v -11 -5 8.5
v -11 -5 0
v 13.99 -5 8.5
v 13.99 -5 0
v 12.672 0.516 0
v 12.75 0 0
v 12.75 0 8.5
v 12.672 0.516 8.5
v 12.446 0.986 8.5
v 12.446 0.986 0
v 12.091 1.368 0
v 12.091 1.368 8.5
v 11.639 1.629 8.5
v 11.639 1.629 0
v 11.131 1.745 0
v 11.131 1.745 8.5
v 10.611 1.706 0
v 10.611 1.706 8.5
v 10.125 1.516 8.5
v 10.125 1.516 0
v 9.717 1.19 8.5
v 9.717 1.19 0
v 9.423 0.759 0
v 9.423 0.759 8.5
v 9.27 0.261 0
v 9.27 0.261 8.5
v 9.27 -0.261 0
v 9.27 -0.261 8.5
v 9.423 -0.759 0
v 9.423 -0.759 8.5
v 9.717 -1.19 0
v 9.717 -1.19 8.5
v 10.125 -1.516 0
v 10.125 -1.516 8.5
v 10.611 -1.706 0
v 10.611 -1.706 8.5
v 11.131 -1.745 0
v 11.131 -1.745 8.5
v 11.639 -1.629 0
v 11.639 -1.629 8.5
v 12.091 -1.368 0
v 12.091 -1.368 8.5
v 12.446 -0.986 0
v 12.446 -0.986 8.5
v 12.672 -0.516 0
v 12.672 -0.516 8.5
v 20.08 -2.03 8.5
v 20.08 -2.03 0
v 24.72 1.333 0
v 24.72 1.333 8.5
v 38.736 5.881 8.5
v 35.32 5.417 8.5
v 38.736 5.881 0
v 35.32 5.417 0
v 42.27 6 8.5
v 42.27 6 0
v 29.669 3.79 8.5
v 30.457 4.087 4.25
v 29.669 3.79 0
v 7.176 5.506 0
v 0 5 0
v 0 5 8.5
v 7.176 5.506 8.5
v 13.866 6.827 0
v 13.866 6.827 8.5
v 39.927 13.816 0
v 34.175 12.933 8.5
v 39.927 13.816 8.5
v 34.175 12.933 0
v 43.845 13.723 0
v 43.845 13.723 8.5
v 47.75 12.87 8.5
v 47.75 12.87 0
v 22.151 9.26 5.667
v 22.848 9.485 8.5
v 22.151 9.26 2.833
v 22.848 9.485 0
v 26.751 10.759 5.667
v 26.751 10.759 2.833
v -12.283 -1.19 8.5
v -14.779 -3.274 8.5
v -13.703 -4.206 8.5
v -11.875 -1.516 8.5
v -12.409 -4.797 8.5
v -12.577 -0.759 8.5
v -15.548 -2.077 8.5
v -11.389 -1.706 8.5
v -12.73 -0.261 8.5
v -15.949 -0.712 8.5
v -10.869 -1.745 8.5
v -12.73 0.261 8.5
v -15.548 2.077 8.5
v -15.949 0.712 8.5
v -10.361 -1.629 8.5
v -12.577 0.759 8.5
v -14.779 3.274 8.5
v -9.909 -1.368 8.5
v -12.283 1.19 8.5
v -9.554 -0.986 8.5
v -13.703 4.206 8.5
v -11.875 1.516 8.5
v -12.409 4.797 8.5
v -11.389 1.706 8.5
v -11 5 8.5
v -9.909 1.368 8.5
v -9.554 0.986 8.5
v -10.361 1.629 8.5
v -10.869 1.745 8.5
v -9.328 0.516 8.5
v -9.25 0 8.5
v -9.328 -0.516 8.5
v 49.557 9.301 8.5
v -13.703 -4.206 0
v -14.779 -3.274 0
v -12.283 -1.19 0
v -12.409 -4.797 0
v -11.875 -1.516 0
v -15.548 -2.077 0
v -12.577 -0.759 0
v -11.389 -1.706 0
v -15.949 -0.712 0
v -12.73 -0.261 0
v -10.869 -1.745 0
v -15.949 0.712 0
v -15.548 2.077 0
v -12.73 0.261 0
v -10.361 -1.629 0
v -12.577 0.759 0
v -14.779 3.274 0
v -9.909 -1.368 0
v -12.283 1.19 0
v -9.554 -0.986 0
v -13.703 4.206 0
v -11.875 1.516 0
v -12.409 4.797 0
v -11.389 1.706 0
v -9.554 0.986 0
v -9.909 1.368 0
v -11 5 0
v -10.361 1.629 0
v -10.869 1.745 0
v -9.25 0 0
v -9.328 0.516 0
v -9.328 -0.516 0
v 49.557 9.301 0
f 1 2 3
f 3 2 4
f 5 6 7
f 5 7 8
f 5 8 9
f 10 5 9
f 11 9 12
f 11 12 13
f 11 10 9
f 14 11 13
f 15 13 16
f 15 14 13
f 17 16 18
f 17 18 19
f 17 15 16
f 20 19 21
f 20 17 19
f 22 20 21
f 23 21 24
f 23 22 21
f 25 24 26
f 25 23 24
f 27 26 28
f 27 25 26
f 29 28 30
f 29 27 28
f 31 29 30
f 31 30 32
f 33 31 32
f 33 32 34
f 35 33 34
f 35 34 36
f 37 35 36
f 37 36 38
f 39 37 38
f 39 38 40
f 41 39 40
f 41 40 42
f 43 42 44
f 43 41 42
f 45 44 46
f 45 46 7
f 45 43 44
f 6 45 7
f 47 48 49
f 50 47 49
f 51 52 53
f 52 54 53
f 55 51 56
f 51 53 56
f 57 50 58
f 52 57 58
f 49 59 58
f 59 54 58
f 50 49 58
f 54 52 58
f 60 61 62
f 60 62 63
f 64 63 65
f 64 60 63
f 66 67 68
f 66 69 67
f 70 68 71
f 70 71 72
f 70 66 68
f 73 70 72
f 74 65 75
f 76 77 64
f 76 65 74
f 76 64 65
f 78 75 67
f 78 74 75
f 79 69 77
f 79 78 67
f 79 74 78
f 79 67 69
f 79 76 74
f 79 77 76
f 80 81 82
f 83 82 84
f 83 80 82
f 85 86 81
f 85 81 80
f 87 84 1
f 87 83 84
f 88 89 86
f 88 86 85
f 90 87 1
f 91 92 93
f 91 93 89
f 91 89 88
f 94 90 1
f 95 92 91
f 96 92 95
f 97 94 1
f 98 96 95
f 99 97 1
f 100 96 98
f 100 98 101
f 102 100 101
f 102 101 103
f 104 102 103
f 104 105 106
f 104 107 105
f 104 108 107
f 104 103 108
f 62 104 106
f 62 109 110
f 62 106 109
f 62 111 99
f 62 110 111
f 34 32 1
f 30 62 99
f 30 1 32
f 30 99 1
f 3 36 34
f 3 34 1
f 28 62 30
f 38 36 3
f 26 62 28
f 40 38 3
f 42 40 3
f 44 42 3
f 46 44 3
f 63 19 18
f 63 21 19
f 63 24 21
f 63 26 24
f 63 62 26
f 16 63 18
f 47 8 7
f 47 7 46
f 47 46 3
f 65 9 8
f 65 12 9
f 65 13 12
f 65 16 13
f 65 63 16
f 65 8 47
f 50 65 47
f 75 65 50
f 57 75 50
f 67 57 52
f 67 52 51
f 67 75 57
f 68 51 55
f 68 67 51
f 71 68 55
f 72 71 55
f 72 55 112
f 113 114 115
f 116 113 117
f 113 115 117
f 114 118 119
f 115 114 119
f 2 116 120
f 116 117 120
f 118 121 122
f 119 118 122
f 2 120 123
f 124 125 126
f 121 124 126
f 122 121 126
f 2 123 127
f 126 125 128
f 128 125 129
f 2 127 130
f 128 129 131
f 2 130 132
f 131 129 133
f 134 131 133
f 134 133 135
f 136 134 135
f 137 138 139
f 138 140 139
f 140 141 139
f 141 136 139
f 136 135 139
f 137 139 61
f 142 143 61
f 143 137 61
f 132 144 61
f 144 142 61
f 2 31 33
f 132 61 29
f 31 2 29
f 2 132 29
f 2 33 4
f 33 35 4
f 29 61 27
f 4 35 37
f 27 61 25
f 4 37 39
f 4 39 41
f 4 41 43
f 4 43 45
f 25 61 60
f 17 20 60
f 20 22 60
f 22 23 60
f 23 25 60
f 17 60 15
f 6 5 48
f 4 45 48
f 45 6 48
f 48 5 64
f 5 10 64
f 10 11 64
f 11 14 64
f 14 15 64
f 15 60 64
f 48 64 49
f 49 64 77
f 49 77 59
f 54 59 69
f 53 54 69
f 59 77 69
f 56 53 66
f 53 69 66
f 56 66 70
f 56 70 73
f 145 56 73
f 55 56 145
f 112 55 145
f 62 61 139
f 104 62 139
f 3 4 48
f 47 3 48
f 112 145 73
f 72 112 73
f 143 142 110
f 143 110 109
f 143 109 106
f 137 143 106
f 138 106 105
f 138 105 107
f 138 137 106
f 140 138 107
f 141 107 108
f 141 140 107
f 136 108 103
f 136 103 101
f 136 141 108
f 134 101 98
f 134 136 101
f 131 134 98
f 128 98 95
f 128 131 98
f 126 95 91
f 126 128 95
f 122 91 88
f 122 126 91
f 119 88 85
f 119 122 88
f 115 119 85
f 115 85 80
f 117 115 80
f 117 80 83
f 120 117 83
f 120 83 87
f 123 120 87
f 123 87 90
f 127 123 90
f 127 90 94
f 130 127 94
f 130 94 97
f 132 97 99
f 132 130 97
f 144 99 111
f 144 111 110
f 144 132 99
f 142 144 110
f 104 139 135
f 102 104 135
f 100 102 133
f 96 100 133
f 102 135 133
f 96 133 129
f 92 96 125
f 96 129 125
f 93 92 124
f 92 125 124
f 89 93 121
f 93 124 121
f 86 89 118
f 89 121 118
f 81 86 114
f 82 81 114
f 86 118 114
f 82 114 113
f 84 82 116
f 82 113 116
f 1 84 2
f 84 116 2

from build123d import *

# Parameters (mm, degrees)
SKETCH1_R           = 5
SKETCH1_R_2         = 1.75
BOSS_EXTRUDE1_DEPTH = 8.5
BOSS_EXTRUDE2_START = -8.5
BOSS_EXTRUDE2_DEPTH = 8.5


with BuildPart() as part:
    # Sketch1 → Boss-Extrude1 (new body)
    # profile 1 of 3: a face of its own
    with BuildSketch(Plane.XY):
        with Locations((-11, 0)):
            Circle(SKETCH1_R)
        with Locations((-11, 0)):
            Circle(SKETCH1_R_2, mode=Mode.SUBTRACT)
    # profile 2 of 3: a face of its own
    with BuildSketch(Plane.XY):
        with BuildLine():
            Line((11, 5), (-11, 5))
            ThreePointArc((-11, 5), (-7.464466094, 3.535533906), (-6, 0))
            ThreePointArc((-6, 0), (-7.464466094, -3.535533906), (-11, -5))
            Line((-11, -5), (11, -5))
            ThreePointArc((11, -5), (6, 0), (11, 5))
        make_face()
    # profile 3 of 3: a face of its own
    with BuildSketch(Plane.XY):
        with Locations((11, 0)):
            Circle(SKETCH1_R)
        with Locations((11, 0)):
            Circle(SKETCH1_R_2, mode=Mode.SUBTRACT)
    extrude(amount=BOSS_EXTRUDE1_DEPTH)

    # Sketch2 → Boss-Extrude2 (add)
    with BuildSketch(Plane.XY.offset(8.5).offset(BOSS_EXTRUDE2_START)):
        with BuildLine():
            Line((0, 5), (11, 5))
            ThreePointArc((11, 5), (16, 0), (11, -5))
            Line((11, -5), (13.99, -5))
            Line((13.99, -5), (20.08, -2.029708536))
            add(Edge.make_bspline(
                [(20.08, -2.029708536), (29.738723452, 6.188270814), (42.27, 6)],
                knots=[0, 0, 0, 1, 1, 1], degree=2))
            Line((42.27, 6), (49.557013712, 9.301428655))
            Line((49.557013712, 9.301428655), (47.75, 12.87))
            add(Edge.make_bspline(
                [(0, 5), (8.211836031, 5.003252827), (16.545155604, 7.403359581), (31.829335326, 12.436602795), (40.713583566, 15.205464732), (47.75, 12.87)],
                knots=[0, 0, 0, 0, 0.466100506, 0.566100506, 1, 1, 1, 1], degree=3))
        make_face()
    extrude(amount=BOSS_EXTRUDE2_DEPTH)


solid = part.part
